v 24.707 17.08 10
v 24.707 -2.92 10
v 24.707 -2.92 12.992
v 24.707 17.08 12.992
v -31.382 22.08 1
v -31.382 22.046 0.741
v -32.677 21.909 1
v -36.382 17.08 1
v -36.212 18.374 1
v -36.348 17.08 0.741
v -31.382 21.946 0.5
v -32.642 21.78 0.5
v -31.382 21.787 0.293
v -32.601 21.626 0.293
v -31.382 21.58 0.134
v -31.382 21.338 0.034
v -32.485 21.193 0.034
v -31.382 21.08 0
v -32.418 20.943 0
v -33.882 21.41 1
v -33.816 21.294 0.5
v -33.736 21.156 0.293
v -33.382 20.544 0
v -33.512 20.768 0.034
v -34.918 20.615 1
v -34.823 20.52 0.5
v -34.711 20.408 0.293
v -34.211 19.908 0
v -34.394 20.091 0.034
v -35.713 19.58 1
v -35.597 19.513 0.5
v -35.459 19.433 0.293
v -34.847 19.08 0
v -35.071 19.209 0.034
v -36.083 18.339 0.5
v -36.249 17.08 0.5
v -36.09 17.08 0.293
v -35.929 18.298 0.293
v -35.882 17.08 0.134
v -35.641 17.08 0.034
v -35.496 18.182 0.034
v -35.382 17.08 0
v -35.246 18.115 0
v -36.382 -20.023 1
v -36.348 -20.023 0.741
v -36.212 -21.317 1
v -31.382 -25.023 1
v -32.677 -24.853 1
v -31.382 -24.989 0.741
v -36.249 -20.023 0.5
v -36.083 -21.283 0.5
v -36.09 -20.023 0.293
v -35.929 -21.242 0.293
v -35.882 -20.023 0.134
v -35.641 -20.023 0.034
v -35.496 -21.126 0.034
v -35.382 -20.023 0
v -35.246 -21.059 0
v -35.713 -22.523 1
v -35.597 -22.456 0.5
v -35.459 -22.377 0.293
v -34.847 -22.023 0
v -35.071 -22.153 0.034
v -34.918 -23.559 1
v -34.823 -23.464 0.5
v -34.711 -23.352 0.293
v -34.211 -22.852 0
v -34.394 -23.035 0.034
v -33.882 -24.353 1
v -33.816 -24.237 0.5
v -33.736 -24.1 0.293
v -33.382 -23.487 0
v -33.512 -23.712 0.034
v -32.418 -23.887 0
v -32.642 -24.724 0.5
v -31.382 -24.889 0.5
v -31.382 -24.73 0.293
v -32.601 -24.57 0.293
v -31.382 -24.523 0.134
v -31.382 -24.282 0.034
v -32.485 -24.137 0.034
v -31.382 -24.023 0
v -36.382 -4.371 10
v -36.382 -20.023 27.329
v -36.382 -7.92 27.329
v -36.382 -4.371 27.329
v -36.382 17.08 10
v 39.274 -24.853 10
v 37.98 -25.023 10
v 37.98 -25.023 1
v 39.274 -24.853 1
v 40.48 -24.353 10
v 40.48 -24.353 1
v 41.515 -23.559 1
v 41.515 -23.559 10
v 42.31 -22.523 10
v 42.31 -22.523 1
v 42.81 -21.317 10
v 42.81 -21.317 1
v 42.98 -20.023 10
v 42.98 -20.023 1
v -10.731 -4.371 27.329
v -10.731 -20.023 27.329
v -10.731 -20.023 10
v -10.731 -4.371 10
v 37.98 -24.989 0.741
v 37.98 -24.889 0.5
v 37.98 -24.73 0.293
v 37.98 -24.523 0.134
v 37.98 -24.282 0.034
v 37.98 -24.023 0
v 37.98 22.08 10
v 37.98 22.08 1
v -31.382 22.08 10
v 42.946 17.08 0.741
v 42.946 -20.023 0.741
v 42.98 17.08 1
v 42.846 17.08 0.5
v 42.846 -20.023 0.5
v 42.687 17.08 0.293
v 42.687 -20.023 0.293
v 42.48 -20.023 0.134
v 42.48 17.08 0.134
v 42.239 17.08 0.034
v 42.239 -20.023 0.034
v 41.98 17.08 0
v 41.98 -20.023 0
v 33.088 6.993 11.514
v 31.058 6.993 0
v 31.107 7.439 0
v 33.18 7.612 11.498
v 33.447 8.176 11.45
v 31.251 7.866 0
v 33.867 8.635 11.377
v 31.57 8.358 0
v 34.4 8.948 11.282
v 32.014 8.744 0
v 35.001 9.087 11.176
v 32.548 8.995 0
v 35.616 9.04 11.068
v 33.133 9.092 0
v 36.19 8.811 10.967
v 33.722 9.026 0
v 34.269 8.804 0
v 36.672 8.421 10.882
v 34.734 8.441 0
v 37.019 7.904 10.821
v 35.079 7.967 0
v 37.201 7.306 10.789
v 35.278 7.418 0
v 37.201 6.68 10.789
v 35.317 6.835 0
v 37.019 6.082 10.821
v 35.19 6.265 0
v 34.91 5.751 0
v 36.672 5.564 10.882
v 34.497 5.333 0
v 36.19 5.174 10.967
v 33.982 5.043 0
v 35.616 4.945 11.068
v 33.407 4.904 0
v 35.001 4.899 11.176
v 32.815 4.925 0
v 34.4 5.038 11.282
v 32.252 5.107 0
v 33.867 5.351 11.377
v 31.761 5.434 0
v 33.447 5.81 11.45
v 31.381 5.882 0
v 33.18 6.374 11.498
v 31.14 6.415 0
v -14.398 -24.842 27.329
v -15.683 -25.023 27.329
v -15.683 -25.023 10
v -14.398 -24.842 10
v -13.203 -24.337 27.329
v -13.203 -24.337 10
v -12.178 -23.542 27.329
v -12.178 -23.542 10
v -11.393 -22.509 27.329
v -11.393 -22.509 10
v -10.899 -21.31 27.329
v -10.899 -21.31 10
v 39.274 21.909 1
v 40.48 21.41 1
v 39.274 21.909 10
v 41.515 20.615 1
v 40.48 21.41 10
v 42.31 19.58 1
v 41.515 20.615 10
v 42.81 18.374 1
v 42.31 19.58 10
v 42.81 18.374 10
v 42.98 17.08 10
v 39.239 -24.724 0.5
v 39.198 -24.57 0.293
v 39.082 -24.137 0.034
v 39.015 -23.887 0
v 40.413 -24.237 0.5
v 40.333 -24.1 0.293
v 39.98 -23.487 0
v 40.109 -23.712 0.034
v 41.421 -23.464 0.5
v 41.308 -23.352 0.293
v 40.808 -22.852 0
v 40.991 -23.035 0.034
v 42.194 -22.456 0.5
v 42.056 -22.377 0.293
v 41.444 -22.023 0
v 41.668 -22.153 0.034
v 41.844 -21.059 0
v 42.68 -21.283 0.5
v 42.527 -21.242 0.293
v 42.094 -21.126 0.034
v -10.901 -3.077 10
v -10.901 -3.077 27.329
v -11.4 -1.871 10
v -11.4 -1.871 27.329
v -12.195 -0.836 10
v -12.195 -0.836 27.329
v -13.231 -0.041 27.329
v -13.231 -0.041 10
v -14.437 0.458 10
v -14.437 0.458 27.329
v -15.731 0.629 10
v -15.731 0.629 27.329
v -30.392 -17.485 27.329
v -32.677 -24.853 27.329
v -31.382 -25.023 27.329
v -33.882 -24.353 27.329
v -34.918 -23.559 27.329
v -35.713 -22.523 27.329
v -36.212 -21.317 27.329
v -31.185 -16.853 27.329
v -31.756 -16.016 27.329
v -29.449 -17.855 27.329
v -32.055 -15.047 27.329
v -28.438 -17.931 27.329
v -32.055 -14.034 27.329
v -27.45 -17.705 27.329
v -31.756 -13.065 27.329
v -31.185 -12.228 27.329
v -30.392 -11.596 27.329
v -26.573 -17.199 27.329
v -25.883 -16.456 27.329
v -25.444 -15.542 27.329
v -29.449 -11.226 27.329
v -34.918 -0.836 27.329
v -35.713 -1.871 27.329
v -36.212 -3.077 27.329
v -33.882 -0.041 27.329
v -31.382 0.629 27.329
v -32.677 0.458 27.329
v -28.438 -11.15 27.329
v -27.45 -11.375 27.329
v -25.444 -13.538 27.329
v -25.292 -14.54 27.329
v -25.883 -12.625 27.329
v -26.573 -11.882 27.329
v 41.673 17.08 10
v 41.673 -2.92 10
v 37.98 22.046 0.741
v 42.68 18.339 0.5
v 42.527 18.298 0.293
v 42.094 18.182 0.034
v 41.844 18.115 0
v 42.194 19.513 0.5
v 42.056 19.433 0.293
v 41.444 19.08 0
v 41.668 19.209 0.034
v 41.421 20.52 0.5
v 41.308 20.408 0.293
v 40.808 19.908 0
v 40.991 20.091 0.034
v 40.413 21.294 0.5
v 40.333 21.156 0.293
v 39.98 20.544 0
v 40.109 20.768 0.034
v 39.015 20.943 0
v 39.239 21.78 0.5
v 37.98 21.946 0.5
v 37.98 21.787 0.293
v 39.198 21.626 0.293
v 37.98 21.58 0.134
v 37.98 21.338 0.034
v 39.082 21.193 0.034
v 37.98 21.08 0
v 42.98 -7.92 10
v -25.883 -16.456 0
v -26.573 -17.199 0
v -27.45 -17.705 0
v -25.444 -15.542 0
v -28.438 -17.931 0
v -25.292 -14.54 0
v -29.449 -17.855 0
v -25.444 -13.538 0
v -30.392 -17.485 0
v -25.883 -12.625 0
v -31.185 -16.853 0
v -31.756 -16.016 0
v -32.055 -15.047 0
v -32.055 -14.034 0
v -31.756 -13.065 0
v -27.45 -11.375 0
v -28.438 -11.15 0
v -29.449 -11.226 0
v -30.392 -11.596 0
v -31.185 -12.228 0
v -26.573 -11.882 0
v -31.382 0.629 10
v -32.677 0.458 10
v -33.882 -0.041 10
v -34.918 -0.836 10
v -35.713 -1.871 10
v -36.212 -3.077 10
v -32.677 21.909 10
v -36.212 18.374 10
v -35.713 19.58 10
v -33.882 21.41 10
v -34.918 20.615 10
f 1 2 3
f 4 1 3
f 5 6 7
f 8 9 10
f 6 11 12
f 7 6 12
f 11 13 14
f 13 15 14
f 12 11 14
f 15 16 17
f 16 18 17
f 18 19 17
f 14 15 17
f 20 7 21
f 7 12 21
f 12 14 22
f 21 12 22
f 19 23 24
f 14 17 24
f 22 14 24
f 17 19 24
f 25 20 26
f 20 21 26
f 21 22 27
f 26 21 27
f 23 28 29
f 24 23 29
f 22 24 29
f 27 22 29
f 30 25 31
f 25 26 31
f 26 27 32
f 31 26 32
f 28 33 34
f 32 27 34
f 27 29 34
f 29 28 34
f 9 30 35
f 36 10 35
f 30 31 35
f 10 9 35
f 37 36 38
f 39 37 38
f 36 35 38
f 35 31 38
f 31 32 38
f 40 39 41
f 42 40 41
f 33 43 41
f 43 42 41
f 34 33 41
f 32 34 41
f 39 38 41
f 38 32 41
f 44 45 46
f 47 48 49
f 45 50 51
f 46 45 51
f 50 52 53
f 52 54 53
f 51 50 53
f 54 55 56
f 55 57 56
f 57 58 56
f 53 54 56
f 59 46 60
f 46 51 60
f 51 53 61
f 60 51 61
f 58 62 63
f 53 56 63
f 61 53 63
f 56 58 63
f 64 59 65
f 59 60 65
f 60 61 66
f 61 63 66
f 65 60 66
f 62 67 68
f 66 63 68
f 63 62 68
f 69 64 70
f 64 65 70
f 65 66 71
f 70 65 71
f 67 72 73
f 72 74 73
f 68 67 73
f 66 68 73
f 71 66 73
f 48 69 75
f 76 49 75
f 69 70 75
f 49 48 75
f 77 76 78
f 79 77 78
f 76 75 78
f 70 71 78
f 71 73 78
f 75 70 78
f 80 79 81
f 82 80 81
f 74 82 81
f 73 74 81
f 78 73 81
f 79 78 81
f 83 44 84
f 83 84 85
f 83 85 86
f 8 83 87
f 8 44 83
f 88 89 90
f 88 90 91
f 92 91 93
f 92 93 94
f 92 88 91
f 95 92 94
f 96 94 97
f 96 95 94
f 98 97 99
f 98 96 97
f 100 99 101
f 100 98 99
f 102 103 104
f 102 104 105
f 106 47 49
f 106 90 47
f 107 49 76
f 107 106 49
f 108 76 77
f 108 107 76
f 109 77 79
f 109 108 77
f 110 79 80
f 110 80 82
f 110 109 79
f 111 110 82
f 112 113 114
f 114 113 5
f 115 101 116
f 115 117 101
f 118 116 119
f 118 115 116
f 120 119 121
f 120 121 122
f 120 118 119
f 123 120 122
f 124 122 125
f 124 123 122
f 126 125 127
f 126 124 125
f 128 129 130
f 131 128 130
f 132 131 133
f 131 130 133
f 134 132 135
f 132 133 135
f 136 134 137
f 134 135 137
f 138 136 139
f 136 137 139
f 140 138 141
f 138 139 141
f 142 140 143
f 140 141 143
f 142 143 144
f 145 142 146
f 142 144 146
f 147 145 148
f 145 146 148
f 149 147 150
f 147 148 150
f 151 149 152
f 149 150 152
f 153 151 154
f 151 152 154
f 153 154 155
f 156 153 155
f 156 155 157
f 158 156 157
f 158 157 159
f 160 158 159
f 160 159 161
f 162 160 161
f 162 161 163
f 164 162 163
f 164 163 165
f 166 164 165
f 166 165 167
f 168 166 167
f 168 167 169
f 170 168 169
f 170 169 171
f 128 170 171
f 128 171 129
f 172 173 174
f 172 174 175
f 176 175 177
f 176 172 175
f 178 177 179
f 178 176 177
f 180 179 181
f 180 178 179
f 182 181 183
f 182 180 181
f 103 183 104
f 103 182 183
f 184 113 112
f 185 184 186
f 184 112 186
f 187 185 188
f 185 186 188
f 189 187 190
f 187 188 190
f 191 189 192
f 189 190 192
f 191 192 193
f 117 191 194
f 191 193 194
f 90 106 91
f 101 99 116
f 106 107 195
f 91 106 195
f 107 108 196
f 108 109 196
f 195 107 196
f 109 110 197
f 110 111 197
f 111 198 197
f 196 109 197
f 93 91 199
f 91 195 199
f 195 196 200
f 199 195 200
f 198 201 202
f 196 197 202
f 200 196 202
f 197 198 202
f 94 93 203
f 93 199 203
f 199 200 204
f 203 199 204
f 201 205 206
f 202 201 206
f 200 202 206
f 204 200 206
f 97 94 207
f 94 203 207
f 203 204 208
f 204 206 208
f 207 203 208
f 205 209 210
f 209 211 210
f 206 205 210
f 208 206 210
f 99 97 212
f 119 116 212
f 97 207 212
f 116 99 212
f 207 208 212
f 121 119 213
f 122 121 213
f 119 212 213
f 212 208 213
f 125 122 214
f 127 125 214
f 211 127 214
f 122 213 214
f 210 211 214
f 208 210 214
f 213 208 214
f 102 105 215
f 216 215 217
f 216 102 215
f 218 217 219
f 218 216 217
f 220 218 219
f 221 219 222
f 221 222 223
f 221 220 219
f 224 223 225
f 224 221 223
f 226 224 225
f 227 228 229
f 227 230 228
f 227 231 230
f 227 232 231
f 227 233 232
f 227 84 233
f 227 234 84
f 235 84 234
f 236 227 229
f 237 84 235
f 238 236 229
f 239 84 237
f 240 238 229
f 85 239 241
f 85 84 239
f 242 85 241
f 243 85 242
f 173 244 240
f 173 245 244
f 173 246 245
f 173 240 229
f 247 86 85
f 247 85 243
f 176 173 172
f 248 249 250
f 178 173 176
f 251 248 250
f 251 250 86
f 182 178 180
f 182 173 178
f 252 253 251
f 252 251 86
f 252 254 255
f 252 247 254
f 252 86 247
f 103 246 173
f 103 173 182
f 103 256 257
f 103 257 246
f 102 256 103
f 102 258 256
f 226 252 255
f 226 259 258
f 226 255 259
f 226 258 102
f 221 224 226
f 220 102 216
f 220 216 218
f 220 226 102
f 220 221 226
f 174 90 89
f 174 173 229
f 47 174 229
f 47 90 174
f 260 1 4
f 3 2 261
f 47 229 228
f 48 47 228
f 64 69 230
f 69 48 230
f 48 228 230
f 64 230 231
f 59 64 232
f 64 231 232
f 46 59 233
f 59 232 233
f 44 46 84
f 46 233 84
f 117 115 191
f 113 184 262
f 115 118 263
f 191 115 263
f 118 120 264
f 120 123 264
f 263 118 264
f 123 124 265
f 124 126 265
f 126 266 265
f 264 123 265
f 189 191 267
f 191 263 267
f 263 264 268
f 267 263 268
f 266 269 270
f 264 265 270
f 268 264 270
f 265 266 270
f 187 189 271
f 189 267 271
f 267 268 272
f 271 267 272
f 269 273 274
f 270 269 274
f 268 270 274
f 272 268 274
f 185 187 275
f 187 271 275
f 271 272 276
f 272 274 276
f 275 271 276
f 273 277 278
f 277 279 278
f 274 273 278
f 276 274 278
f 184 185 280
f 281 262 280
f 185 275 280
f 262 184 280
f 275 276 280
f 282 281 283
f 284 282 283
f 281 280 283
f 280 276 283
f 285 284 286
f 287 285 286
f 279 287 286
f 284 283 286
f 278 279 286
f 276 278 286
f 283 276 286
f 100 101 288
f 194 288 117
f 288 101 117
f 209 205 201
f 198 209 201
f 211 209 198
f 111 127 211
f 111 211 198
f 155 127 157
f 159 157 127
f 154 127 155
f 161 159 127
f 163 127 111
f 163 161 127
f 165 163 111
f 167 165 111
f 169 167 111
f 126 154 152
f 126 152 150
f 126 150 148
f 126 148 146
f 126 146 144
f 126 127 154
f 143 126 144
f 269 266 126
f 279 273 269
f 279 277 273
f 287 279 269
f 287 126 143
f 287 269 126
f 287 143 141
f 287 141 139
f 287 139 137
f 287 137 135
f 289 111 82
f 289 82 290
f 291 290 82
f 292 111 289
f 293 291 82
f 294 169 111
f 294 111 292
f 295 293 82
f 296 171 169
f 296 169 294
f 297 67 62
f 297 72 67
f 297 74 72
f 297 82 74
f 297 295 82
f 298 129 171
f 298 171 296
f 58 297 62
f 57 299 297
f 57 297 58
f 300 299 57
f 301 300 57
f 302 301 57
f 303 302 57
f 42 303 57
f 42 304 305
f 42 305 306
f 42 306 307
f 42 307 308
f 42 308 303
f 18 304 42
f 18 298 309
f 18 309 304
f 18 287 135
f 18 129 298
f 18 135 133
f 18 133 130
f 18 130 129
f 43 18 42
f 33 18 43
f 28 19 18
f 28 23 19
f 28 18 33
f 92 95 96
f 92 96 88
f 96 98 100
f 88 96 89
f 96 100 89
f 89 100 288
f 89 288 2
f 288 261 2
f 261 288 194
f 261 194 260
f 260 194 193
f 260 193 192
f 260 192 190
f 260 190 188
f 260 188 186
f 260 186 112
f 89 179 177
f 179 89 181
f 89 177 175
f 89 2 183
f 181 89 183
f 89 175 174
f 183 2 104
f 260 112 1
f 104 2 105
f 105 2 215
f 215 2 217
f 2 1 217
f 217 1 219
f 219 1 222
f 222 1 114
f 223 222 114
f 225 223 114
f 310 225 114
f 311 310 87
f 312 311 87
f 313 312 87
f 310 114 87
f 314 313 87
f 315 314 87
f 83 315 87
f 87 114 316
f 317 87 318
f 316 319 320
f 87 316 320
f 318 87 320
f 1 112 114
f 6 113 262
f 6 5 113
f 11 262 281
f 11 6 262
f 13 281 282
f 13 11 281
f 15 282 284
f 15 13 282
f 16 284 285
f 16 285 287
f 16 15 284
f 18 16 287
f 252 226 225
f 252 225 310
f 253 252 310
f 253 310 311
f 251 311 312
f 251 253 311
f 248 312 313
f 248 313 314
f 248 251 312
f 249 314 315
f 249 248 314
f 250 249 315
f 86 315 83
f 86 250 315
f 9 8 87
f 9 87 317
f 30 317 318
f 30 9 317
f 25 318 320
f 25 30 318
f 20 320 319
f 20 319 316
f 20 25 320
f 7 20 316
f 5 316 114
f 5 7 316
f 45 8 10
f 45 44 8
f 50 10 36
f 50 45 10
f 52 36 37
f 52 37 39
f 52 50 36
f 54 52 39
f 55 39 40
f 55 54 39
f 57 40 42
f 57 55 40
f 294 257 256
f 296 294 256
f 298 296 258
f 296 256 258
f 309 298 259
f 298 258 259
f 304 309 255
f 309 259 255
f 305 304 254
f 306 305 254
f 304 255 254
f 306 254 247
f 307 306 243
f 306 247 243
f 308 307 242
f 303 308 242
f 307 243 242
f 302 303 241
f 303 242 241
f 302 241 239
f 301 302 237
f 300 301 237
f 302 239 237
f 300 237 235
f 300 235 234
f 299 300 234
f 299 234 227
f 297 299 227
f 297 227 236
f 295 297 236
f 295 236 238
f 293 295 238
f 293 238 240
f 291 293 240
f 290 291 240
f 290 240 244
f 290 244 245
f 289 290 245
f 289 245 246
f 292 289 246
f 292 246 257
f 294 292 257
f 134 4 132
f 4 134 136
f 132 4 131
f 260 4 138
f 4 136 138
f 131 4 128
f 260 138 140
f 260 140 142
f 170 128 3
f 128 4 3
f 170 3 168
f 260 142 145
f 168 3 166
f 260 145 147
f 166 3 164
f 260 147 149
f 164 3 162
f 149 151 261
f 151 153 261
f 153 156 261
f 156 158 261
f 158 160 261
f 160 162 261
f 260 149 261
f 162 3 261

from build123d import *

# Parameters (mm, degrees)
SKETCH1_W           = 43.699940619
SKETCH1_H           = 33.102984907
BOSS_EXTRUDE1_DEPTH = 10
BOSS_EXTRUDE3_DEPTH = 10
M5_TAPPED_HOLE1_D   = 4.2
SKETCH18_W          = 13
SKETCH18_H          = 47.102984907
CUT_EXTRUDE1_DEPTH  = 10
SKETCH20_W          = 10
SKETCH20_H          = 17.102984907
CUT_EXTRUDE3_DEPTH  = 10
SKETCH22_W          = 20.699940619
SKETCH22_H          = 17.102984907
BOSS_EXTRUDE4_DEPTH = 17.3288
SKETCH23_W          = 58.662437665
SKETCH23_H          = 17.102984907
BOSS_EXTRUDE5_DEPTH = 10
BOSS_EXTRUDE6_DEPTH = 20
M8_TAPPED_HOLE3_D   = 6.8
FILLET4_R           = 5
FILLET6_R           = 5
FILLET7_R           = 1


with BuildPart() as part:
    # Sketch1 → Boss-Extrude1 (new body)
    with BuildSketch(Plane.XY):
        Polygon((42.979890311, 22.079670103), (-49.382487973, 22.079670103), (-49.382487973, -7.920329897), (-5.682547354, -7.920329897), (42.979890311, -7.920329897), align=None)
        with Locations((-27.532517664, -24.471822351)):
            Rectangle(SKETCH1_W, SKETCH1_H)
    extrude(amount=BOSS_EXTRUDE1_DEPTH)

    # Sketch10 → Boss-Extrude3 (add, symmetric)
    with BuildSketch(Plane(origin=(0, 7.079670103, 0), x_dir=(-1, 0, 0), z_dir=(0, -1, 0))):
        Polygon((-24.707127971, -10), (-24.707127971, -12.991563555), (-41.673127971, -10), align=None)
    extrude(amount=BOSS_EXTRUDE3_DEPTH, both=True)

    # M5 Tapped Hole1 (through all)
    with Locations(Plane(origin=(35.156022436, 6.992687386, 11.149141542), x_dir=(0.984807753012, 0, -0.173648177667), z_dir=(0.173648177667, 0, 0.984807753012))):
        with Locations((0, 0)):
            Hole(M5_TAPPED_HOLE1_D / 2)

    # Sketch18 → Cut-Extrude1 (cut)
    with BuildSketch(Plane.XY.offset(10)):
        Polygon((-36.382487973, -25.023314804), (-49.382487973, -25.023314804), (-49.382487973, -41.023314804), (-5.682547354, -41.023314804), (-5.682547354, -25.023314804), align=None)
        with Locations((-42.882487973, -1.471822351)):
            Rectangle(SKETCH18_W, SKETCH18_H)
    extrude(amount=-CUT_EXTRUDE1_DEPTH, mode=Mode.SUBTRACT)

    # Sketch20 → Cut-Extrude3 (cut)
    with BuildSketch(Plane(origin=(0, 0, 0), x_dir=(-1, 0, 0), z_dir=(0, 0, -1))):
        with Locations((10.682547354, -16.471822351)):
            Rectangle(SKETCH20_W, SKETCH20_H)
    extrude(amount=-CUT_EXTRUDE3_DEPTH, mode=Mode.SUBTRACT)

    # Sketch22 → Boss-Extrude4 (add)
    with BuildSketch(Plane.XY.offset(10)):
        with Locations((-26.032517664, -16.471822351)):
            Rectangle(SKETCH22_W, SKETCH22_H)
    extrude(amount=BOSS_EXTRUDE4_DEPTH)

    # Sketch23 → Boss-Extrude5 (add)
    with BuildSketch(Plane(origin=(0, 0, 0), x_dir=(-1, 0, 0), z_dir=(0, 0, -1))):
        with Locations((-13.648671479, -16.471822351)):
            Rectangle(SKETCH23_W, SKETCH23_H)
    extrude(amount=-BOSS_EXTRUDE5_DEPTH)

    # Sketch27 → Boss-Extrude6 (add)
    with BuildSketch(Plane.XY.offset(27.3288)):
        with BuildLine():
            Line((-36.382487973, -25.023314804), (-15.730623406, -25.023314804))
            ThreePointArc((-15.730623406, -25.023314804), (-12.1950895, -23.55884871), (-10.730623406, -20.023314804))
            Line((-10.730623406, -20.023314804), (-10.730623406, -4.371450237))
            ThreePointArc((-10.730623406, -4.371450237), (-12.1950895, -0.835916331), (-15.730623406, 0.628549763))
            Line((-15.730623406, 0.628549763), (-31.382487973, 0.628549763))
            ThreePointArc((-31.382487973, 0.628549763), (-34.918021878, -0.835916331), (-36.382487973, -4.371450237))
            Line((-36.382487973, -4.371450237), (-36.382487973, -25.023314804))
        make_face()
    extrude(amount=-BOSS_EXTRUDE6_DEPTH)

    # M8 Tapped Hole3 (through all)
    with Locations(Plane(origin=(-28.692487973, -14.540329897, 0), x_dir=(-1, 0, 0), z_dir=(0, 0, -1))):
        with Locations((0, 0)):
            Hole(M8_TAPPED_HOLE3_D / 2)

    # Fillet4
    fillet4_edges = [part.edges().sort_by_distance(p)[0] for p in [
        (-36.382487973, -25.023314804, 13.6644),
    ]]
    fillet(fillet4_edges, radius=FILLET4_R)

    # Fillet6
    fillet6_edges = [part.edges().sort_by_distance(p)[0] for p in [
        (-36.382487973, 22.079670103, 5),
        (42.979890311, 22.079670103, 5),
        (42.979890311, -25.023314804, 5),
    ]]
    fillet(fillet6_edges, radius=FILLET6_R)

    # Fillet7
    fillet7_edges = [part.edges().sort_by_distance(p)[0] for p in [
        (3.298701169, -25.023314804, 0),
        (-34.918021878, -23.55884871, 0),
        (3.298701169, 22.079670103, 0),
        (-36.382487973, -1.471822351, 0),
        (42.979890311, -1.471822351, 0),
        (-34.918021878, 20.615204009, 0),
        (41.515424217, -23.55884871, 0),
        (41.515424217, 20.615204009, 0),
    ]]
    fillet(fillet7_edges, radius=FILLET7_R)


solid = part.part
